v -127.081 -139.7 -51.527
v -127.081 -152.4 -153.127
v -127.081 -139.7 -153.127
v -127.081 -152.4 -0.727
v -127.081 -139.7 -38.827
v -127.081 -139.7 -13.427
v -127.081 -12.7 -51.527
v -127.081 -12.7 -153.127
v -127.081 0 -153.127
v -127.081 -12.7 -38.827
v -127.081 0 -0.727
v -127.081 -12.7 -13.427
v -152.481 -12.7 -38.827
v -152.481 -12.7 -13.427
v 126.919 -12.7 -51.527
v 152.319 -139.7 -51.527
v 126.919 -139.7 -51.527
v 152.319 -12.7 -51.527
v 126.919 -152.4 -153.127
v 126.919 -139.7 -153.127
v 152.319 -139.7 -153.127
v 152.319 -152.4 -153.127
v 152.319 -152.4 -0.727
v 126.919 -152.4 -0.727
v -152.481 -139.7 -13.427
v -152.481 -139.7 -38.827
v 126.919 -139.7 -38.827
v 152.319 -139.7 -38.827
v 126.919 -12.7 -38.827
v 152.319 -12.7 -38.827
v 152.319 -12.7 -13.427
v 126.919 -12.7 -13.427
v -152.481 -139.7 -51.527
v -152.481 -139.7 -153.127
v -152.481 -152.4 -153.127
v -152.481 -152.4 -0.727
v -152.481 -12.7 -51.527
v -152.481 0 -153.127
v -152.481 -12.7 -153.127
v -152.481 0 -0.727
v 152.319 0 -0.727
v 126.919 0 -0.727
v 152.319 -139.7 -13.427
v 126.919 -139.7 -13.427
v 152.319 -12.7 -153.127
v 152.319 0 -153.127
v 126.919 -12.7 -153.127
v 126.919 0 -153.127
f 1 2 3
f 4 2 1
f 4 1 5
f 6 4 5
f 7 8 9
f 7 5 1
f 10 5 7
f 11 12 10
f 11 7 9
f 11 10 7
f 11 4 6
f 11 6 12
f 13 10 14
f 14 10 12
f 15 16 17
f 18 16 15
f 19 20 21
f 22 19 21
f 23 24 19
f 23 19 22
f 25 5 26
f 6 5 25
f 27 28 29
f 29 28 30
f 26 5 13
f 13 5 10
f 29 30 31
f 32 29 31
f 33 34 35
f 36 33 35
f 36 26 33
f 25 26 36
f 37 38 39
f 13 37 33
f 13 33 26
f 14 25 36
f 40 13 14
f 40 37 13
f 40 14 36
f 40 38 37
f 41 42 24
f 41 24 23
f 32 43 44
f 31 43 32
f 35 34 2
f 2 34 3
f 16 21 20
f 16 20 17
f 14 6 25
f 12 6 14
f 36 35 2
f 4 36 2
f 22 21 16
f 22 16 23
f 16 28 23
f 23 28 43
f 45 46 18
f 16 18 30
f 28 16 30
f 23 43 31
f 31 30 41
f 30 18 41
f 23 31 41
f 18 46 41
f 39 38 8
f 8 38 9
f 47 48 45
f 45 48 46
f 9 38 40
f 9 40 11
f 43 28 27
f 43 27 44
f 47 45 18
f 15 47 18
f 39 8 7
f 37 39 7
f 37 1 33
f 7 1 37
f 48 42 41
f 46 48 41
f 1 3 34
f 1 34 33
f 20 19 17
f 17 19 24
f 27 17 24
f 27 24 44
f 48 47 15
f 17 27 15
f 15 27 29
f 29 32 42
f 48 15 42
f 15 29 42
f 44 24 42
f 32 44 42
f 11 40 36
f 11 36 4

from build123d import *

# Parameters (mm, degrees)
F0_W     = 304.8
F0_H     = 152.4
F1_DEPTH = 152.4
F2_W     = 127
F2_H     = 101.6
F2_H_2   = 25.4
F3_DEPTH = 304.8
F4_W     = 254
F4_H     = 152.4
F5_DEPTH = 152.4


with BuildPart() as f1:
    # F0 (on Front) → F1 (new body)
    with BuildSketch(Plane.XZ):
        with Locations((-0.0805743039, -76.9265565288)):
            Rectangle(F0_W, F0_H)
    extrude(amount=F1_DEPTH)

    # F2 (on face) → F3 (cut)
    with BuildSketch(Plane.YZ.offset(152.3194256961)):
        with Locations((-76.2, -102.3265565288)):
            Rectangle(F2_W, F2_H)
        with Locations((-76.2, -26.1265565288)):
            Rectangle(F2_W, F2_H_2)
    extrude(amount=-F3_DEPTH, mode=Mode.SUBTRACT)

    # F4 (on face) → F5 (cut)
    with BuildSketch(Plane.XY.offset(-0.7265565288)):
        with Locations((-0.0805743039, -76.2)):
            Rectangle(F4_W, F4_H)
    extrude(amount=-F5_DEPTH, mode=Mode.SUBTRACT)


solid = f1.part
